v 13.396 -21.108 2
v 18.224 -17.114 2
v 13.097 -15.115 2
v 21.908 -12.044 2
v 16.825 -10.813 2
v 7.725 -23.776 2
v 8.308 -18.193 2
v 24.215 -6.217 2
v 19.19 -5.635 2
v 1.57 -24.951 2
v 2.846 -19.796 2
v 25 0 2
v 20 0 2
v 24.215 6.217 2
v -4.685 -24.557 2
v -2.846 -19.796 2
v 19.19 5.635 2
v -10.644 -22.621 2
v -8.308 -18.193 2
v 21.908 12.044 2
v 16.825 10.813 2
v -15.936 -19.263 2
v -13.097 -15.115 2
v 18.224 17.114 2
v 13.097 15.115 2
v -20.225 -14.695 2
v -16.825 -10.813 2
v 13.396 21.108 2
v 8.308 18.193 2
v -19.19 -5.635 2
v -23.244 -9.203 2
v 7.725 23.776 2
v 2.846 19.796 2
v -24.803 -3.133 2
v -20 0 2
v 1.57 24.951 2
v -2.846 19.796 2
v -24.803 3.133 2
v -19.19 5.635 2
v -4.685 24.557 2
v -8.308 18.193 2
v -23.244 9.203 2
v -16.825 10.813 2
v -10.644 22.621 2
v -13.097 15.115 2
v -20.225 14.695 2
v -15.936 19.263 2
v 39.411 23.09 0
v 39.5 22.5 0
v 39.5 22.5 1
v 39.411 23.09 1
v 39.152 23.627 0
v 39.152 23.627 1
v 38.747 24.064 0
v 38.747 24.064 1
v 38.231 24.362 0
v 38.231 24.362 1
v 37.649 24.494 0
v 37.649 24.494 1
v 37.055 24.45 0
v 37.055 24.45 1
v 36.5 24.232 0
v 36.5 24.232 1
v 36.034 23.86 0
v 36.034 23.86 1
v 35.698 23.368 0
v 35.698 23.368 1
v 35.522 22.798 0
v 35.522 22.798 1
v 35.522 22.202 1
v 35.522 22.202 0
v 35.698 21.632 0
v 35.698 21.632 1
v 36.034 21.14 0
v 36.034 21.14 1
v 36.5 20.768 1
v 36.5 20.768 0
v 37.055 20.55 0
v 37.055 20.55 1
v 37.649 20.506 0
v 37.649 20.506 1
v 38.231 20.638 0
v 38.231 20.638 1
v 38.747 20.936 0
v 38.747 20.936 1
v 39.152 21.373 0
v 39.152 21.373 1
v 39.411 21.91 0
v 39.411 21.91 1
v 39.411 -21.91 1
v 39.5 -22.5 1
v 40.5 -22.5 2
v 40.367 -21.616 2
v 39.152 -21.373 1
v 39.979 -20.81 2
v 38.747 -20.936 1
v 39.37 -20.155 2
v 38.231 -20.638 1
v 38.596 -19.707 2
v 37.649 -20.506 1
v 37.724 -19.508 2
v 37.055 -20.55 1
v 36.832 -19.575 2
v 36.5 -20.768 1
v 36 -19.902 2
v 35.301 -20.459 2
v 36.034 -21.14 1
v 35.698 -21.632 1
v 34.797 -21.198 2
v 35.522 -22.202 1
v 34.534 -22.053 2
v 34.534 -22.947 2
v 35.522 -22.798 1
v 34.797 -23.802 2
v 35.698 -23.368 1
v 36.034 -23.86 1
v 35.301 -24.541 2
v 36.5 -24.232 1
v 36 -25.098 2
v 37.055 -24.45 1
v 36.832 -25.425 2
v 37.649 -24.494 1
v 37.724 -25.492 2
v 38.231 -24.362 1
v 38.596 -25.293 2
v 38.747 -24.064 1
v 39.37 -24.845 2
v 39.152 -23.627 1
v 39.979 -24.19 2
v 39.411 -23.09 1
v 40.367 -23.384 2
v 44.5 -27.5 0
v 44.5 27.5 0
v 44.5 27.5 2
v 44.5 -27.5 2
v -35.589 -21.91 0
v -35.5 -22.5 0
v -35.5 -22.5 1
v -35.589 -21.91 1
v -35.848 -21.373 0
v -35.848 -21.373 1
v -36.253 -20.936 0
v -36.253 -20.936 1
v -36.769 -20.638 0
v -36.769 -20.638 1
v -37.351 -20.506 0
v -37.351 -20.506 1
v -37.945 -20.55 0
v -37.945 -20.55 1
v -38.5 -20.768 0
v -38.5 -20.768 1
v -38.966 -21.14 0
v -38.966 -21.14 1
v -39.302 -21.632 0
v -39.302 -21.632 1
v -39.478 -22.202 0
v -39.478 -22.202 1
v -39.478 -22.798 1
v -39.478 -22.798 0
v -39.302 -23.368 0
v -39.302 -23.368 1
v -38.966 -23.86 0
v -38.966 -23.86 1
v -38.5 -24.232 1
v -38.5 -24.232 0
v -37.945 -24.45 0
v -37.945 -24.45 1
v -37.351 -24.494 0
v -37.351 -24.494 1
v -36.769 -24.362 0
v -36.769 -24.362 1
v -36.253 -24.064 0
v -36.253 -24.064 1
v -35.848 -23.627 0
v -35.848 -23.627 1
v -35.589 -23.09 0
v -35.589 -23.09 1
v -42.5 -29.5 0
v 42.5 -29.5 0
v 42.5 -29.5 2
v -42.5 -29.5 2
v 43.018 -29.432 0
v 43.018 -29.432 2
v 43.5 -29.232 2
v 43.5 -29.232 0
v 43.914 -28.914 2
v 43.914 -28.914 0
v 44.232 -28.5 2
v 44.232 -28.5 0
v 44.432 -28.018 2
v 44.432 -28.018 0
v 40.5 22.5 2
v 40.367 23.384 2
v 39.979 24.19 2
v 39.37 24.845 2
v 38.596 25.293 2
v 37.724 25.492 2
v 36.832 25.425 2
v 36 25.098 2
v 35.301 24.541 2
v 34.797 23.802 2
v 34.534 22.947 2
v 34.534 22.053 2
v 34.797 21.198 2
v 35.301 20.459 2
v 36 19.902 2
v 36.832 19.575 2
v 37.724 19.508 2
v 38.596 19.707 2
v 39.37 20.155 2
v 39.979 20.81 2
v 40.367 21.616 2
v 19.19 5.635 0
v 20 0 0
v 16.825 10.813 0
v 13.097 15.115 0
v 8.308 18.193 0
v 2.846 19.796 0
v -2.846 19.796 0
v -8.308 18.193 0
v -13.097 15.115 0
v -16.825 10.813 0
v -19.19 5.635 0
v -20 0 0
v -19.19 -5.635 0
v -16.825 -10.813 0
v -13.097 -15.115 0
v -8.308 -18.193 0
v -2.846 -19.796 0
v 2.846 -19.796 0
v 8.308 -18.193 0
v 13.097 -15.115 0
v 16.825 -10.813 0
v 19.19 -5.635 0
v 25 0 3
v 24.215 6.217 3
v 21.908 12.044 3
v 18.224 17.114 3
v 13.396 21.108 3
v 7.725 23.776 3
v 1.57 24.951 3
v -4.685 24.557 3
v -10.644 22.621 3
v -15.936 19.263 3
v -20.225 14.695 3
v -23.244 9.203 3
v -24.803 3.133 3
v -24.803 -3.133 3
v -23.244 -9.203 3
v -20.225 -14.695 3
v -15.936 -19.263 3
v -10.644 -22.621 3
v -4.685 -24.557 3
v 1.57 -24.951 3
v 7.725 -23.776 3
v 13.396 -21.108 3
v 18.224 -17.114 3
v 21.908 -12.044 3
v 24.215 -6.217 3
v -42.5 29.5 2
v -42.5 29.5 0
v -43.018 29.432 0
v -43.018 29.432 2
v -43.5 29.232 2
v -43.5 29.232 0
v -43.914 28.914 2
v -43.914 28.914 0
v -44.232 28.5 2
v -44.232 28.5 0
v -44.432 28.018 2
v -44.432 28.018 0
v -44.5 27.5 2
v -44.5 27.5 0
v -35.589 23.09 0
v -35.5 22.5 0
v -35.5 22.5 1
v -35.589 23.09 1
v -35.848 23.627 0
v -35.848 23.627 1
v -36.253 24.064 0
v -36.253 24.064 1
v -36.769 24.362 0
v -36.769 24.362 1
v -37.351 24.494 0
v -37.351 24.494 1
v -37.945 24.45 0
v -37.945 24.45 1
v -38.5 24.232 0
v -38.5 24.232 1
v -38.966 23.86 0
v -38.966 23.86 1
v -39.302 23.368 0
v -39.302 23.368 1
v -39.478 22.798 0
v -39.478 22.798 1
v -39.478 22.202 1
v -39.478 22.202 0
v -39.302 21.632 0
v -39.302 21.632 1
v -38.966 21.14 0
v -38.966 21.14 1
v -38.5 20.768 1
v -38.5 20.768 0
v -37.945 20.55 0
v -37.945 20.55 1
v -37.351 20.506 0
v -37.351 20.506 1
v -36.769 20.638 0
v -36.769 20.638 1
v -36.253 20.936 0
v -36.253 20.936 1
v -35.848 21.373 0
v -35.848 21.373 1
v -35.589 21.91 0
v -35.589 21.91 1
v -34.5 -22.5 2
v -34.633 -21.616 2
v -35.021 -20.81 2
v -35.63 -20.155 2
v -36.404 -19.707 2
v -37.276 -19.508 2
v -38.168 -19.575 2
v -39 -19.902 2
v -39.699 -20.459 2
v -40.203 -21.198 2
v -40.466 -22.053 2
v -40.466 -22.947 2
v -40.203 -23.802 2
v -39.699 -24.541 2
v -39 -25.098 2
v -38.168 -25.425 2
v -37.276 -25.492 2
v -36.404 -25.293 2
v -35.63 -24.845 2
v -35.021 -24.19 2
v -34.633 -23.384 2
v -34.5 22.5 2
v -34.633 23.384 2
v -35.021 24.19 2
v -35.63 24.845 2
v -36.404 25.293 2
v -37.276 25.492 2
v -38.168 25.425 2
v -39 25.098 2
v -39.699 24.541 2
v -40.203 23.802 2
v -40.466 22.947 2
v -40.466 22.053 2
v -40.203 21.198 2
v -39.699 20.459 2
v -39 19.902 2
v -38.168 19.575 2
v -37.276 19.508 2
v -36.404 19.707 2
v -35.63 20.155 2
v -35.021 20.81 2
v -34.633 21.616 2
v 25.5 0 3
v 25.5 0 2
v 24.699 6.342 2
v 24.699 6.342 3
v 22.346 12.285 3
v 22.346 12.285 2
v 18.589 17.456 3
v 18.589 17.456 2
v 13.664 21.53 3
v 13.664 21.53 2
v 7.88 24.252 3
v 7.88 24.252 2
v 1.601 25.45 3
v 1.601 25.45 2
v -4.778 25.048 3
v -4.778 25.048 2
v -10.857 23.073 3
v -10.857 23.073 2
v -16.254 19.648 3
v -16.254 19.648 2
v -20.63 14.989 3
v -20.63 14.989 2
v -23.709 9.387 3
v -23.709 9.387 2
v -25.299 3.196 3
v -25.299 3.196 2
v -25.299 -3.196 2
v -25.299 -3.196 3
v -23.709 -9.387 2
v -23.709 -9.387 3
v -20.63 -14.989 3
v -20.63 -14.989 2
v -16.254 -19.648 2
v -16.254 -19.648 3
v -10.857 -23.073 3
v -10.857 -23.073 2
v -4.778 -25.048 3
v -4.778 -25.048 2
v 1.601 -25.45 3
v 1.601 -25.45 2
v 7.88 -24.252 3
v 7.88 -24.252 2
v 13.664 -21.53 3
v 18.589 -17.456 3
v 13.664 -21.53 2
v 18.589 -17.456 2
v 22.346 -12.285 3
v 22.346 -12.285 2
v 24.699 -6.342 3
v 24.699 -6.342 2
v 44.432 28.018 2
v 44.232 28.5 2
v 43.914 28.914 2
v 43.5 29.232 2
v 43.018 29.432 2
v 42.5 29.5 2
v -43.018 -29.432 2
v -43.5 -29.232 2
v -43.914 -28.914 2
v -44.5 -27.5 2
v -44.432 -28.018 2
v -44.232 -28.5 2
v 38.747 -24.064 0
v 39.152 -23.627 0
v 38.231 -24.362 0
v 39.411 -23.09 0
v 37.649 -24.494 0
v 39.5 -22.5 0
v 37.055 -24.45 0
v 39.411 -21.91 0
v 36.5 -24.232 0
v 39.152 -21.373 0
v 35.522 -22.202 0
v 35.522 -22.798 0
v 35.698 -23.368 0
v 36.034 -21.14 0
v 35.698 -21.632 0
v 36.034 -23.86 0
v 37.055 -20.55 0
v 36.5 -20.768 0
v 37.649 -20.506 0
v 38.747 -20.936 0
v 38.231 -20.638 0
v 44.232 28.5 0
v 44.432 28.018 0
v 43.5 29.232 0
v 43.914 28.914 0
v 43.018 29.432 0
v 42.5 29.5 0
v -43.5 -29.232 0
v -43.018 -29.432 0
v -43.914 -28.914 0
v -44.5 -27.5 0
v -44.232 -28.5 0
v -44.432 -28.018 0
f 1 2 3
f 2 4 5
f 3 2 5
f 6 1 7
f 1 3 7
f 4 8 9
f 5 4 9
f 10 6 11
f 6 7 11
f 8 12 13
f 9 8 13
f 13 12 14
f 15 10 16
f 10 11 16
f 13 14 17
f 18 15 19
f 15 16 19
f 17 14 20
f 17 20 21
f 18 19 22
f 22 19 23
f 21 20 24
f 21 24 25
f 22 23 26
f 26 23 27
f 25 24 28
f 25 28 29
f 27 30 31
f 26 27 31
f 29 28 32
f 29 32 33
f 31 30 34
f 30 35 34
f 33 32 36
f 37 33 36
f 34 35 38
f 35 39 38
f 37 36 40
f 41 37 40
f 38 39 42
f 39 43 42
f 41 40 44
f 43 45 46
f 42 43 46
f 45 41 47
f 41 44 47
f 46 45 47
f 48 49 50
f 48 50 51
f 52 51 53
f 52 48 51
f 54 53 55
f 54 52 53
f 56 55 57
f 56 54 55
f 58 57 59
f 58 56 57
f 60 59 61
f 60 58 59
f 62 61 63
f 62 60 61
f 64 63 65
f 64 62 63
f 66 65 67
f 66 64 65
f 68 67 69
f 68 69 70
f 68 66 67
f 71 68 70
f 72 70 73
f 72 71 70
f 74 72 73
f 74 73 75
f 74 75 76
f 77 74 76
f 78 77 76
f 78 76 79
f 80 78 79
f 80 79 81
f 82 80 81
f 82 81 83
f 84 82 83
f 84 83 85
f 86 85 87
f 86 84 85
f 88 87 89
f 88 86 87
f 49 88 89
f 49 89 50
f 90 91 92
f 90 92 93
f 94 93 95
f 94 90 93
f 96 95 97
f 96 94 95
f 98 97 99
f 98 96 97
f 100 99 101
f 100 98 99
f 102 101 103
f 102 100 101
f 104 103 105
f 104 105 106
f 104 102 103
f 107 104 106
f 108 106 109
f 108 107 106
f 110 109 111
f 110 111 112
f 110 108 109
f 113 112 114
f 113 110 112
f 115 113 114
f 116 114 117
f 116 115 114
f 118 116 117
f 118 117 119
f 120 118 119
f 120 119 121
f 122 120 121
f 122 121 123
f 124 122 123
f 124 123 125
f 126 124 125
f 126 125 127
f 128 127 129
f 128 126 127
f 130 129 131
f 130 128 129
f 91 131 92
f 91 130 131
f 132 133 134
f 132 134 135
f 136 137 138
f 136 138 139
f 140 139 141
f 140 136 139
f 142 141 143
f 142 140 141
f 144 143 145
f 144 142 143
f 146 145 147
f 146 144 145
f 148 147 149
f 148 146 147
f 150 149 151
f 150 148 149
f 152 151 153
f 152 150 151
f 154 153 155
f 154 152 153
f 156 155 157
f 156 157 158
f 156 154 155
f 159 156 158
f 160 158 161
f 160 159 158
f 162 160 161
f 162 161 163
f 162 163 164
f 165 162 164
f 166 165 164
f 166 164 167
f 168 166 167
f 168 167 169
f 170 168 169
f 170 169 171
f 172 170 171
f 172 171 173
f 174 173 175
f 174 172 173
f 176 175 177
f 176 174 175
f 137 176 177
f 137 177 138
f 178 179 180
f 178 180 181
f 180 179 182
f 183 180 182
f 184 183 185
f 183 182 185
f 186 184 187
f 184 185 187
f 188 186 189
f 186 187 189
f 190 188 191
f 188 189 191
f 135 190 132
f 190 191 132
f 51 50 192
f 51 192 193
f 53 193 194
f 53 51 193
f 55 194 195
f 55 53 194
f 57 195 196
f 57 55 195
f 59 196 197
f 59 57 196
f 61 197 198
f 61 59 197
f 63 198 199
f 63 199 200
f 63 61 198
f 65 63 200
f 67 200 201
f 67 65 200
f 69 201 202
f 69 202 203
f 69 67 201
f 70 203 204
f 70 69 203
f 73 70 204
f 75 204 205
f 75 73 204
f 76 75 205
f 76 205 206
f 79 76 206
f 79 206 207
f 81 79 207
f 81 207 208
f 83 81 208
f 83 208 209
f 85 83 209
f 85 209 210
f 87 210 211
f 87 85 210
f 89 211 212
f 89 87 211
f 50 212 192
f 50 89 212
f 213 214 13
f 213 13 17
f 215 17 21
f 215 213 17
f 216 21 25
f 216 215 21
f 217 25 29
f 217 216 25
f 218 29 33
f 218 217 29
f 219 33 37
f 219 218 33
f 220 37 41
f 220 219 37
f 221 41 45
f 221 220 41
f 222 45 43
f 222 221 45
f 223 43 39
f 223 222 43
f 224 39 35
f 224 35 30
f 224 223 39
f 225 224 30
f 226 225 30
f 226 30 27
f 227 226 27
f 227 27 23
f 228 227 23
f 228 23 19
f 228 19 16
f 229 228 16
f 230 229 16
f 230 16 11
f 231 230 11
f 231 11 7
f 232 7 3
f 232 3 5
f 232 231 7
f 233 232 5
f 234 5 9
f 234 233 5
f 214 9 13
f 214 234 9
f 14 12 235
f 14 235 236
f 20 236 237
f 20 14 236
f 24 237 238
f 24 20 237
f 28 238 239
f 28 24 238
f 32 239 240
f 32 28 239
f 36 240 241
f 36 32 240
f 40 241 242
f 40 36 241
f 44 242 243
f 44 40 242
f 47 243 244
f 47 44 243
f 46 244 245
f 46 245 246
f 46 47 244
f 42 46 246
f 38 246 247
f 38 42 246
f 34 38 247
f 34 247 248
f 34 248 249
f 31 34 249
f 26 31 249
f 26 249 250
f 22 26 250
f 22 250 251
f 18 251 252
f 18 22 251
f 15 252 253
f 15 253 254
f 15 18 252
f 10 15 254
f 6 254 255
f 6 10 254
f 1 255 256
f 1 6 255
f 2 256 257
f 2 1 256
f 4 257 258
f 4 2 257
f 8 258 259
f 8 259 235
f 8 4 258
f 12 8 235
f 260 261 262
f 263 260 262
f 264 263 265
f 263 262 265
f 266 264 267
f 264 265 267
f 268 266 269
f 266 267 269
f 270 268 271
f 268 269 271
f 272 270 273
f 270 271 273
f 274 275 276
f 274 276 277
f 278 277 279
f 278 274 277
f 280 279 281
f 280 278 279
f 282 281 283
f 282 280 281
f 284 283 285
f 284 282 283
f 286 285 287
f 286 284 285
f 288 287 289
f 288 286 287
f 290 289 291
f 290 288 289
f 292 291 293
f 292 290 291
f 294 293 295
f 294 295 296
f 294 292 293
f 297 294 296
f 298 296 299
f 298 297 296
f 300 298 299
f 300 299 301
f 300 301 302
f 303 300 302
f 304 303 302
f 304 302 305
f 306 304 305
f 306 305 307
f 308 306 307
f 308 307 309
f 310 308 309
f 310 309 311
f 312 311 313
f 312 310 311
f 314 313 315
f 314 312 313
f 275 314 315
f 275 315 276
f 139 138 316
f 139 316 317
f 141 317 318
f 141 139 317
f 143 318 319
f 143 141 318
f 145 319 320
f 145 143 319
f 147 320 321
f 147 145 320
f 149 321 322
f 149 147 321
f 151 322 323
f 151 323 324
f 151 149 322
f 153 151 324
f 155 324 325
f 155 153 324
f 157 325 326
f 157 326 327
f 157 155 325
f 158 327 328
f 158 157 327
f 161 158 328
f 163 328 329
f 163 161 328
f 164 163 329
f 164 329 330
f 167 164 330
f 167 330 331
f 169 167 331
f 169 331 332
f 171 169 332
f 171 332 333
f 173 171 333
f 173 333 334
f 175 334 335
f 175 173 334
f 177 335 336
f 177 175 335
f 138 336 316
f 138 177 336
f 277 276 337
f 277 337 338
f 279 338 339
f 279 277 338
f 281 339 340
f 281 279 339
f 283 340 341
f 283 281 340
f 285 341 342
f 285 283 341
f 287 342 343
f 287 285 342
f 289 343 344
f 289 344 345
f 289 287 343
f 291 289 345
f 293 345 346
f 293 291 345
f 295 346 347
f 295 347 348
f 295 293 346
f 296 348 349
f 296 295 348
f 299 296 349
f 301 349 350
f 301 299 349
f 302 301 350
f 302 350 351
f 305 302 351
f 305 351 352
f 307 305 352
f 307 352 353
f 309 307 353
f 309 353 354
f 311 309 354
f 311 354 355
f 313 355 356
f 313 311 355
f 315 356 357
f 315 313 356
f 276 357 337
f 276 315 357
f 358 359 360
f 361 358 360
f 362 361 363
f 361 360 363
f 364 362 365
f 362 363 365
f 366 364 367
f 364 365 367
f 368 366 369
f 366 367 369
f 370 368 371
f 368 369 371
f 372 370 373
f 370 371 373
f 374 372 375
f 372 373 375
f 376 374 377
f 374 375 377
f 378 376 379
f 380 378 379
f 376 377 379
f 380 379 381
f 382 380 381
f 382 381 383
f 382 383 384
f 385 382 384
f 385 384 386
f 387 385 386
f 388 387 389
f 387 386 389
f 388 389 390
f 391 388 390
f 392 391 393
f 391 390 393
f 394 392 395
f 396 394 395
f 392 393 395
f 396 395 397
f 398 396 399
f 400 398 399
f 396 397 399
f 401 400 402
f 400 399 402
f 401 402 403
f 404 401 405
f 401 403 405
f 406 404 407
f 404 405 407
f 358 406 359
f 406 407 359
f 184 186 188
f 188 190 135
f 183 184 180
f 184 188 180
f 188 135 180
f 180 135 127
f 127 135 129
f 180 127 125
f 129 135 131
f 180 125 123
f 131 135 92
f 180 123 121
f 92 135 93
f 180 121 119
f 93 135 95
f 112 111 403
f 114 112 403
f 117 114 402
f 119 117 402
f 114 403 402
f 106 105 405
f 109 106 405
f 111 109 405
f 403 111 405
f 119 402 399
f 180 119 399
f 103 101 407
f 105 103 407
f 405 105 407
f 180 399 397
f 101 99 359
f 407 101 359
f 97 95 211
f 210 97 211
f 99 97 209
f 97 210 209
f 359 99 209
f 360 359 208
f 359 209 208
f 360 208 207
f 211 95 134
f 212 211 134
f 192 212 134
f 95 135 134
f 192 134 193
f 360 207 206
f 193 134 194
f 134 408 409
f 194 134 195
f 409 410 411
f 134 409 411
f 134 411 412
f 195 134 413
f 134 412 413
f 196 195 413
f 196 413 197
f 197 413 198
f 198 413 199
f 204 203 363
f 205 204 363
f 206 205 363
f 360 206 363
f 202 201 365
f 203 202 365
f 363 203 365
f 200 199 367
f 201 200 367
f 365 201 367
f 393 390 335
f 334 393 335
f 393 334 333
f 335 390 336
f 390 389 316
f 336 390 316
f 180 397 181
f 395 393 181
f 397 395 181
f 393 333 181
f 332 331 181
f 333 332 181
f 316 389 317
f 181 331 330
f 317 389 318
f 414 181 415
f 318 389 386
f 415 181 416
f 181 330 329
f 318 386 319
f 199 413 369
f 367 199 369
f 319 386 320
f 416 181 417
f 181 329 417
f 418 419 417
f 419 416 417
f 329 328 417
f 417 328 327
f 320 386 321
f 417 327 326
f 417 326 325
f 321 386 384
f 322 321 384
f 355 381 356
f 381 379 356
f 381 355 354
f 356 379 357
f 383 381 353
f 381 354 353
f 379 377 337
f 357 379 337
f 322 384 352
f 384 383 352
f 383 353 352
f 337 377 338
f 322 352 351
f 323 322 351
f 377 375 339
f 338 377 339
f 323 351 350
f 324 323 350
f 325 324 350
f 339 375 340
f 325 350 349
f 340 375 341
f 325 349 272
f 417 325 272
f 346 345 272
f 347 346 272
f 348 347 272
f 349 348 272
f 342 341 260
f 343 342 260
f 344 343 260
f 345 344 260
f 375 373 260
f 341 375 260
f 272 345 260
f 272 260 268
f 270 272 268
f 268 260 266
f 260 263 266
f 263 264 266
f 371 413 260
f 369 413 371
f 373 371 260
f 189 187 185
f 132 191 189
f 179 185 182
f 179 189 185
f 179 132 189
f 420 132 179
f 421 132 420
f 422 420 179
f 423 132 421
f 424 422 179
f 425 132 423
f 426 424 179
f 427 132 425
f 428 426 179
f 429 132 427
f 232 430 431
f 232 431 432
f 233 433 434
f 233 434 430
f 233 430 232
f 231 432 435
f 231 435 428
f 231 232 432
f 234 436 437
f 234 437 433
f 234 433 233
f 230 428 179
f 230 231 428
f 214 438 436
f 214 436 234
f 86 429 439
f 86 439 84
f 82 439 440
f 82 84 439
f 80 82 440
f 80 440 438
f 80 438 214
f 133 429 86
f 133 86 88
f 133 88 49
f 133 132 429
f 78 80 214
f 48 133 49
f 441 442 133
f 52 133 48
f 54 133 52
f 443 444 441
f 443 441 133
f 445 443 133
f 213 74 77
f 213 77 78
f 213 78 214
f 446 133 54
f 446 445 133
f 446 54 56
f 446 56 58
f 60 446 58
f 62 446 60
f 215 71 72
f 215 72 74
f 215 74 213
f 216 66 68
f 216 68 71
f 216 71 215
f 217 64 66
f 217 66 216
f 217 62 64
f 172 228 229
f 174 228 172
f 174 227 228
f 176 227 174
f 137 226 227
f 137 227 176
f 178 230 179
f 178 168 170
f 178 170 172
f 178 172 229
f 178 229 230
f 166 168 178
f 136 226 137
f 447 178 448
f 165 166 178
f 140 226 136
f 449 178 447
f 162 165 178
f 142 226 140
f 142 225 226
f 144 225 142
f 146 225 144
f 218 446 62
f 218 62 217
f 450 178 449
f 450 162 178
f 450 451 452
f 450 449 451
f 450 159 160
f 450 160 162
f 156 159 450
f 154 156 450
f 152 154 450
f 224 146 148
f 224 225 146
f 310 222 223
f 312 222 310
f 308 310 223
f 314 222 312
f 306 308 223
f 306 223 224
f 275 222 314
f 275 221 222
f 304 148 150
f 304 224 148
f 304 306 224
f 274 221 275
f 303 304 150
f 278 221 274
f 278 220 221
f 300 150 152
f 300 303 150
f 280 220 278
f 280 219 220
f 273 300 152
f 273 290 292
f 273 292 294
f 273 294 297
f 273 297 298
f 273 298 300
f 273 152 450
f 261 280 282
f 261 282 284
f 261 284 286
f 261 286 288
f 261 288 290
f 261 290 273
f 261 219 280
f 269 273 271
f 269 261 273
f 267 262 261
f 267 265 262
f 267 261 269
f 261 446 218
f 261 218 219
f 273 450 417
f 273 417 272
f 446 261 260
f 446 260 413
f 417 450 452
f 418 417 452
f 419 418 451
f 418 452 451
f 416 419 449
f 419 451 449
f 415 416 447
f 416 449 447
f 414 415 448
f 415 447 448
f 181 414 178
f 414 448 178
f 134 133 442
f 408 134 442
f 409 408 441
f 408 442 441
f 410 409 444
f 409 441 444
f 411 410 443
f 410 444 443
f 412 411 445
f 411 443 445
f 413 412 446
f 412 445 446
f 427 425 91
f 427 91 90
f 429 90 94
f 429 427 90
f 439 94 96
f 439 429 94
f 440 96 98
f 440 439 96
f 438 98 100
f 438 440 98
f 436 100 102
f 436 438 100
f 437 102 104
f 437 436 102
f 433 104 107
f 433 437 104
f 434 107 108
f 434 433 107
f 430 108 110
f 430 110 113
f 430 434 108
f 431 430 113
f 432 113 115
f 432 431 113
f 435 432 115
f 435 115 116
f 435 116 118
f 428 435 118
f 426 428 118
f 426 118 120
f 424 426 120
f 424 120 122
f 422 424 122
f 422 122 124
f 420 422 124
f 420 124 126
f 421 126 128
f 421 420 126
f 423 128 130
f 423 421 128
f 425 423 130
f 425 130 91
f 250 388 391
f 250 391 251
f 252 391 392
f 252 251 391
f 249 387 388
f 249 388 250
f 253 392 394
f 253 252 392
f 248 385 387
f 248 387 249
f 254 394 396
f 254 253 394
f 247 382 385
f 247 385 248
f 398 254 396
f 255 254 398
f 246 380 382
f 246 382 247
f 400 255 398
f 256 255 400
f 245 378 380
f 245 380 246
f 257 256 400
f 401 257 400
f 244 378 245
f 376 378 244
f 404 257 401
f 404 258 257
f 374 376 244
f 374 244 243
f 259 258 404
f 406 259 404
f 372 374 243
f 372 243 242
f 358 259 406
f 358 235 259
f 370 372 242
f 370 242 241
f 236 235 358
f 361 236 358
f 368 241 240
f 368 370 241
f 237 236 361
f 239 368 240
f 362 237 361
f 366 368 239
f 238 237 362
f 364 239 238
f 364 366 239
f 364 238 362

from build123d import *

# Parameters (mm, degrees)
SKETCH_R      = 20
SKETCH_R_2    = 2
PAD_DEPTH     = 2
SKETCH001_R   = 25.5
SKETCH001_R_2 = 25
PAD001_DEPTH  = 1
CHAMFER_SIZE  = 1


with BuildPart() as part:
    # Sketch → Pad (new body)
    with BuildSketch(Plane.XY):
        with BuildLine():
            Line((-42.5, 29.5), (42.5, 29.5))
            ThreePointArc((44.5, 27.5), (43.914214, 28.914214), (42.5, 29.5))
            Line((44.5, 27.5), (44.5, -27.5))
            ThreePointArc((42.5, -29.5), (43.914214, -28.914214), (44.5, -27.5))
            Line((42.5, -29.5), (-42.5, -29.5))
            ThreePointArc((-44.5, -27.5), (-43.914214, -28.914214), (-42.5, -29.5))
            Line((-44.5, -27.5), (-44.5, 27.5))
            ThreePointArc((-42.5, 29.5), (-43.914214, 28.914214), (-44.5, 27.5))
        make_face()
        Circle(SKETCH_R, mode=Mode.SUBTRACT)
        with Locations((-37.5, 22.5)):
            Circle(SKETCH_R_2, mode=Mode.SUBTRACT)
        with Locations((-37.5, -22.5)):
            Circle(SKETCH_R_2, mode=Mode.SUBTRACT)
        with Locations((37.5, 22.5)):
            Circle(SKETCH_R_2, mode=Mode.SUBTRACT)
        with Locations((37.5, -22.5)):
            Circle(SKETCH_R_2, mode=Mode.SUBTRACT)
    extrude(amount=PAD_DEPTH)

    # Sketch001 → Pad001 (join)
    with BuildSketch(Plane.XY.offset(2)):
        Circle(SKETCH001_R)
        Circle(SKETCH001_R_2, mode=Mode.SUBTRACT)
    extrude(amount=PAD001_DEPTH)

    # Chamfer
    chamfer_edges = [part.edges().sort_by_distance(p)[0] for p in [
        (-39.5, 22.5, 2),
        (-39.5, -22.5, 2),
        (35.5, 22.5, 2),
        (35.5, -22.5, 2),
    ]]
    chamfer(chamfer_edges, length=CHAMFER_SIZE)


solid = part.part
